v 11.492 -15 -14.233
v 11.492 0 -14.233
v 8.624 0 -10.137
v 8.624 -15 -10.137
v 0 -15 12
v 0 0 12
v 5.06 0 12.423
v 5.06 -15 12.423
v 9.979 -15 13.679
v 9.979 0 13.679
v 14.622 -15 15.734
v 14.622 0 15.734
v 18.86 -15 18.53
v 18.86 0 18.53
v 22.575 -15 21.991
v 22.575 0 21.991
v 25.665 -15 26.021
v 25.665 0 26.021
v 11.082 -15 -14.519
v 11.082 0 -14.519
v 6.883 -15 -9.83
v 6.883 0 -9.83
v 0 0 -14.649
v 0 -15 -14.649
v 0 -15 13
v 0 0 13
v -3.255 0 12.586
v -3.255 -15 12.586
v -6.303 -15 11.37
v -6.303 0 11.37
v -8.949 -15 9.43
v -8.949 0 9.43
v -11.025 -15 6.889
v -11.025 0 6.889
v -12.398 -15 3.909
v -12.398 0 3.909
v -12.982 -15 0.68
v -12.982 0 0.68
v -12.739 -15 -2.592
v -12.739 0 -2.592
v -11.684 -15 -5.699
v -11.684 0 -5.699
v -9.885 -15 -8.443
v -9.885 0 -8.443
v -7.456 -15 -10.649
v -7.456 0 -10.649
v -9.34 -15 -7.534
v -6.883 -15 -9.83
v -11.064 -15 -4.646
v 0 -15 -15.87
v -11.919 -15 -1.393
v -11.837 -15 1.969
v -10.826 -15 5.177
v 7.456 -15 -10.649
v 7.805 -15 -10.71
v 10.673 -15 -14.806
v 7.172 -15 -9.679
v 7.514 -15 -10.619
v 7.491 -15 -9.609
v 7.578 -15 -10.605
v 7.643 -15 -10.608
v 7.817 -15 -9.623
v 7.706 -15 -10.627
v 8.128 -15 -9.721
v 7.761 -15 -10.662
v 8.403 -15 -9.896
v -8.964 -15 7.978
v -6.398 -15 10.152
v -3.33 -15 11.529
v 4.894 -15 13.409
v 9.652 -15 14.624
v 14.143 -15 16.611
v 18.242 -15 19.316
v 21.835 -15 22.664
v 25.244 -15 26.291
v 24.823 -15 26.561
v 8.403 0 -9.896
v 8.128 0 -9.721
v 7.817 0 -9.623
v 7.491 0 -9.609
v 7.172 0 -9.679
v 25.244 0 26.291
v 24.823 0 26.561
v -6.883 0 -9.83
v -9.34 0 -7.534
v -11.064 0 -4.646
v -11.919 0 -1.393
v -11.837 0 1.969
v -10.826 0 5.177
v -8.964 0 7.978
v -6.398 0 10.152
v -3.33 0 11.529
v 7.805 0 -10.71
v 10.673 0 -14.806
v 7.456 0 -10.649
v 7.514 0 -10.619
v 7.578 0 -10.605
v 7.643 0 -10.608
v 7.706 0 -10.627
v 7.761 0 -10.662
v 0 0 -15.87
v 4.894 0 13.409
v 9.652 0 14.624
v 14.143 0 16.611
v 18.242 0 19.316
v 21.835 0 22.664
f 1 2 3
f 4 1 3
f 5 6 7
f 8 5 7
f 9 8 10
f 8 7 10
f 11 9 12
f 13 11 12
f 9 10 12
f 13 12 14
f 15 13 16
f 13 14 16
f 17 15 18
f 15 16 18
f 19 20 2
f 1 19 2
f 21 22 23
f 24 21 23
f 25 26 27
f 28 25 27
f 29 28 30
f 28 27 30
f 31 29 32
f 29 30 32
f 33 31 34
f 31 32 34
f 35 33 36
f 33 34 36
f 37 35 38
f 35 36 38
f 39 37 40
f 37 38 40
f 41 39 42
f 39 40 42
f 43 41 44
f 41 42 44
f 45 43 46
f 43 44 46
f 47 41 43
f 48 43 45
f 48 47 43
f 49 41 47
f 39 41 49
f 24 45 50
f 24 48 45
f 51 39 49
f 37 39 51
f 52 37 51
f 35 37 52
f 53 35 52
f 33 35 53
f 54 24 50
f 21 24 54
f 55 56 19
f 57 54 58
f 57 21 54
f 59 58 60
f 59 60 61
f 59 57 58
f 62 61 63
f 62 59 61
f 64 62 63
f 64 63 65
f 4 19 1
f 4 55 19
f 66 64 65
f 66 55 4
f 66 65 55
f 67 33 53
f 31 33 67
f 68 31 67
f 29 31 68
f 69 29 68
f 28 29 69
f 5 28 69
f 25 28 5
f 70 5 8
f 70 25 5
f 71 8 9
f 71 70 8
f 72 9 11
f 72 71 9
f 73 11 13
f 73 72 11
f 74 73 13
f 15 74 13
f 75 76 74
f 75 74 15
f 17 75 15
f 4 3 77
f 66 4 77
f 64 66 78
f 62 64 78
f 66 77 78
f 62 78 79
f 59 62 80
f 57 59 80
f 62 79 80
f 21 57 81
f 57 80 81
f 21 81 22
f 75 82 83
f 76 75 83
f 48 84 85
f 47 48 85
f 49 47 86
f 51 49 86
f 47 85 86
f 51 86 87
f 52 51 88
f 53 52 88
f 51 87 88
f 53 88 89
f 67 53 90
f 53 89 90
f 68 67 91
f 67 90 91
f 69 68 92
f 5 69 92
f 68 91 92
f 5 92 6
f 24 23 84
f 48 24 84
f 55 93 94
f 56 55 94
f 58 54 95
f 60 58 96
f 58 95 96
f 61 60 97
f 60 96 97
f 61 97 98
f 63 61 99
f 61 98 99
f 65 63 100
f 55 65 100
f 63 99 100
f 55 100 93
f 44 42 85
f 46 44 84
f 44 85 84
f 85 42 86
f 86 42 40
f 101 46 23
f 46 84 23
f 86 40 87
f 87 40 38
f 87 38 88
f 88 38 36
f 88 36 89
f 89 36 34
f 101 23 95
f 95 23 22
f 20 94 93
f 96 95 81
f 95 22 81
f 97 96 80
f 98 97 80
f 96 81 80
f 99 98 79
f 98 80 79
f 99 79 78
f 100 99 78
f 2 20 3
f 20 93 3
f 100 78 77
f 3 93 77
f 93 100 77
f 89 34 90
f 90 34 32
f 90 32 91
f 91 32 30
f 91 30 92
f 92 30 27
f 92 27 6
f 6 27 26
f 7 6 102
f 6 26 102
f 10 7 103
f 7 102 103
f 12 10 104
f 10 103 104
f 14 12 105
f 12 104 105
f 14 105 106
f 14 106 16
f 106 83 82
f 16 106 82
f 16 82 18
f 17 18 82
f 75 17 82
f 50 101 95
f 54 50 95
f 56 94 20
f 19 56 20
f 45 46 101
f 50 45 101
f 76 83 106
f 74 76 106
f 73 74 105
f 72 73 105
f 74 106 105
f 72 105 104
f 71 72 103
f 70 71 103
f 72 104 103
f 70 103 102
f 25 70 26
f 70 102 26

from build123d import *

# Parameters (mm, degrees)
F1_DEPTH = 15


with BuildPart() as f1:
    # F0 (on Front) → F1 (new body)
    with BuildSketch(Plane.XZ):
        with BuildLine():
            ThreePointArc((25.24413, 26.290931), (14.382766, 16.172523), (0, 12.5))
            ThreePointArc((0, 12.5), (-11.921462, 3.758822), (-7.169705, -10.239401))
            Line((-7.169705, -10.239401), (0, -15.259682))
            Line((0, -15.259682), (7.169705, -10.239401))
            ThreePointArc((7.169705, -10.239401), (7.730124, -10.115159), (8.214252, -10.423582))
            Line((8.214252, -10.423582), (11.082134, -14.519342))
            Line((11.082134, -14.519342), (11.49171, -14.232554))
            Line((11.49171, -14.232554), (8.623828, -10.136794))
            ThreePointArc((8.623828, -10.136794), (7.816948, -9.622755), (6.882917, -9.829825))
            Line((6.882917, -9.829825), (0, -14.649295))
            Line((0, -14.649295), (-6.882917, -9.829825))
            ThreePointArc((-6.882917, -9.829825), (-11.444604, 3.60847), (0, 12))
            ThreePointArc((0, 12), (14.622479, 15.733732), (25.664865, 26.02078))
            Line((25.664865, 26.02078), (25.24413, 26.290931))
        make_face()
        with BuildLine():
            ThreePointArc((-7.169705, -10.239401), (-11.921462, 3.758822), (0, 12.5))
            ThreePointArc((0, 12.5), (14.382766, 16.172523), (25.24413, 26.290931))
            Line((25.24413, 26.290931), (24.823395, 26.561081))
            ThreePointArc((24.823395, 26.561081), (14.143054, 16.611314), (0, 12.999999))
            ThreePointArc((0, 12.999999), (-12.39832, 3.909175), (-7.456493, -10.648976))
            Line((-7.456493, -10.648976), (0, -15.870069))
            Line((0, -15.870069), (7.456493, -10.648976))
            ThreePointArc((7.456493, -10.648976), (7.6433, -10.607562), (7.804677, -10.71037))
            Line((7.804677, -10.71037), (10.672559, -14.80613))
            Line((10.672559, -14.80613), (11.082134, -14.519342))
            Line((11.082134, -14.519342), (8.214252, -10.423582))
            ThreePointArc((8.214252, -10.423582), (7.730124, -10.115159), (7.169705, -10.239401))
            Line((7.169705, -10.239401), (0, -15.259682))
            Line((0, -15.259682), (-7.169705, -10.239401))
        make_face()
    extrude(amount=F1_DEPTH)


solid = f1.part
